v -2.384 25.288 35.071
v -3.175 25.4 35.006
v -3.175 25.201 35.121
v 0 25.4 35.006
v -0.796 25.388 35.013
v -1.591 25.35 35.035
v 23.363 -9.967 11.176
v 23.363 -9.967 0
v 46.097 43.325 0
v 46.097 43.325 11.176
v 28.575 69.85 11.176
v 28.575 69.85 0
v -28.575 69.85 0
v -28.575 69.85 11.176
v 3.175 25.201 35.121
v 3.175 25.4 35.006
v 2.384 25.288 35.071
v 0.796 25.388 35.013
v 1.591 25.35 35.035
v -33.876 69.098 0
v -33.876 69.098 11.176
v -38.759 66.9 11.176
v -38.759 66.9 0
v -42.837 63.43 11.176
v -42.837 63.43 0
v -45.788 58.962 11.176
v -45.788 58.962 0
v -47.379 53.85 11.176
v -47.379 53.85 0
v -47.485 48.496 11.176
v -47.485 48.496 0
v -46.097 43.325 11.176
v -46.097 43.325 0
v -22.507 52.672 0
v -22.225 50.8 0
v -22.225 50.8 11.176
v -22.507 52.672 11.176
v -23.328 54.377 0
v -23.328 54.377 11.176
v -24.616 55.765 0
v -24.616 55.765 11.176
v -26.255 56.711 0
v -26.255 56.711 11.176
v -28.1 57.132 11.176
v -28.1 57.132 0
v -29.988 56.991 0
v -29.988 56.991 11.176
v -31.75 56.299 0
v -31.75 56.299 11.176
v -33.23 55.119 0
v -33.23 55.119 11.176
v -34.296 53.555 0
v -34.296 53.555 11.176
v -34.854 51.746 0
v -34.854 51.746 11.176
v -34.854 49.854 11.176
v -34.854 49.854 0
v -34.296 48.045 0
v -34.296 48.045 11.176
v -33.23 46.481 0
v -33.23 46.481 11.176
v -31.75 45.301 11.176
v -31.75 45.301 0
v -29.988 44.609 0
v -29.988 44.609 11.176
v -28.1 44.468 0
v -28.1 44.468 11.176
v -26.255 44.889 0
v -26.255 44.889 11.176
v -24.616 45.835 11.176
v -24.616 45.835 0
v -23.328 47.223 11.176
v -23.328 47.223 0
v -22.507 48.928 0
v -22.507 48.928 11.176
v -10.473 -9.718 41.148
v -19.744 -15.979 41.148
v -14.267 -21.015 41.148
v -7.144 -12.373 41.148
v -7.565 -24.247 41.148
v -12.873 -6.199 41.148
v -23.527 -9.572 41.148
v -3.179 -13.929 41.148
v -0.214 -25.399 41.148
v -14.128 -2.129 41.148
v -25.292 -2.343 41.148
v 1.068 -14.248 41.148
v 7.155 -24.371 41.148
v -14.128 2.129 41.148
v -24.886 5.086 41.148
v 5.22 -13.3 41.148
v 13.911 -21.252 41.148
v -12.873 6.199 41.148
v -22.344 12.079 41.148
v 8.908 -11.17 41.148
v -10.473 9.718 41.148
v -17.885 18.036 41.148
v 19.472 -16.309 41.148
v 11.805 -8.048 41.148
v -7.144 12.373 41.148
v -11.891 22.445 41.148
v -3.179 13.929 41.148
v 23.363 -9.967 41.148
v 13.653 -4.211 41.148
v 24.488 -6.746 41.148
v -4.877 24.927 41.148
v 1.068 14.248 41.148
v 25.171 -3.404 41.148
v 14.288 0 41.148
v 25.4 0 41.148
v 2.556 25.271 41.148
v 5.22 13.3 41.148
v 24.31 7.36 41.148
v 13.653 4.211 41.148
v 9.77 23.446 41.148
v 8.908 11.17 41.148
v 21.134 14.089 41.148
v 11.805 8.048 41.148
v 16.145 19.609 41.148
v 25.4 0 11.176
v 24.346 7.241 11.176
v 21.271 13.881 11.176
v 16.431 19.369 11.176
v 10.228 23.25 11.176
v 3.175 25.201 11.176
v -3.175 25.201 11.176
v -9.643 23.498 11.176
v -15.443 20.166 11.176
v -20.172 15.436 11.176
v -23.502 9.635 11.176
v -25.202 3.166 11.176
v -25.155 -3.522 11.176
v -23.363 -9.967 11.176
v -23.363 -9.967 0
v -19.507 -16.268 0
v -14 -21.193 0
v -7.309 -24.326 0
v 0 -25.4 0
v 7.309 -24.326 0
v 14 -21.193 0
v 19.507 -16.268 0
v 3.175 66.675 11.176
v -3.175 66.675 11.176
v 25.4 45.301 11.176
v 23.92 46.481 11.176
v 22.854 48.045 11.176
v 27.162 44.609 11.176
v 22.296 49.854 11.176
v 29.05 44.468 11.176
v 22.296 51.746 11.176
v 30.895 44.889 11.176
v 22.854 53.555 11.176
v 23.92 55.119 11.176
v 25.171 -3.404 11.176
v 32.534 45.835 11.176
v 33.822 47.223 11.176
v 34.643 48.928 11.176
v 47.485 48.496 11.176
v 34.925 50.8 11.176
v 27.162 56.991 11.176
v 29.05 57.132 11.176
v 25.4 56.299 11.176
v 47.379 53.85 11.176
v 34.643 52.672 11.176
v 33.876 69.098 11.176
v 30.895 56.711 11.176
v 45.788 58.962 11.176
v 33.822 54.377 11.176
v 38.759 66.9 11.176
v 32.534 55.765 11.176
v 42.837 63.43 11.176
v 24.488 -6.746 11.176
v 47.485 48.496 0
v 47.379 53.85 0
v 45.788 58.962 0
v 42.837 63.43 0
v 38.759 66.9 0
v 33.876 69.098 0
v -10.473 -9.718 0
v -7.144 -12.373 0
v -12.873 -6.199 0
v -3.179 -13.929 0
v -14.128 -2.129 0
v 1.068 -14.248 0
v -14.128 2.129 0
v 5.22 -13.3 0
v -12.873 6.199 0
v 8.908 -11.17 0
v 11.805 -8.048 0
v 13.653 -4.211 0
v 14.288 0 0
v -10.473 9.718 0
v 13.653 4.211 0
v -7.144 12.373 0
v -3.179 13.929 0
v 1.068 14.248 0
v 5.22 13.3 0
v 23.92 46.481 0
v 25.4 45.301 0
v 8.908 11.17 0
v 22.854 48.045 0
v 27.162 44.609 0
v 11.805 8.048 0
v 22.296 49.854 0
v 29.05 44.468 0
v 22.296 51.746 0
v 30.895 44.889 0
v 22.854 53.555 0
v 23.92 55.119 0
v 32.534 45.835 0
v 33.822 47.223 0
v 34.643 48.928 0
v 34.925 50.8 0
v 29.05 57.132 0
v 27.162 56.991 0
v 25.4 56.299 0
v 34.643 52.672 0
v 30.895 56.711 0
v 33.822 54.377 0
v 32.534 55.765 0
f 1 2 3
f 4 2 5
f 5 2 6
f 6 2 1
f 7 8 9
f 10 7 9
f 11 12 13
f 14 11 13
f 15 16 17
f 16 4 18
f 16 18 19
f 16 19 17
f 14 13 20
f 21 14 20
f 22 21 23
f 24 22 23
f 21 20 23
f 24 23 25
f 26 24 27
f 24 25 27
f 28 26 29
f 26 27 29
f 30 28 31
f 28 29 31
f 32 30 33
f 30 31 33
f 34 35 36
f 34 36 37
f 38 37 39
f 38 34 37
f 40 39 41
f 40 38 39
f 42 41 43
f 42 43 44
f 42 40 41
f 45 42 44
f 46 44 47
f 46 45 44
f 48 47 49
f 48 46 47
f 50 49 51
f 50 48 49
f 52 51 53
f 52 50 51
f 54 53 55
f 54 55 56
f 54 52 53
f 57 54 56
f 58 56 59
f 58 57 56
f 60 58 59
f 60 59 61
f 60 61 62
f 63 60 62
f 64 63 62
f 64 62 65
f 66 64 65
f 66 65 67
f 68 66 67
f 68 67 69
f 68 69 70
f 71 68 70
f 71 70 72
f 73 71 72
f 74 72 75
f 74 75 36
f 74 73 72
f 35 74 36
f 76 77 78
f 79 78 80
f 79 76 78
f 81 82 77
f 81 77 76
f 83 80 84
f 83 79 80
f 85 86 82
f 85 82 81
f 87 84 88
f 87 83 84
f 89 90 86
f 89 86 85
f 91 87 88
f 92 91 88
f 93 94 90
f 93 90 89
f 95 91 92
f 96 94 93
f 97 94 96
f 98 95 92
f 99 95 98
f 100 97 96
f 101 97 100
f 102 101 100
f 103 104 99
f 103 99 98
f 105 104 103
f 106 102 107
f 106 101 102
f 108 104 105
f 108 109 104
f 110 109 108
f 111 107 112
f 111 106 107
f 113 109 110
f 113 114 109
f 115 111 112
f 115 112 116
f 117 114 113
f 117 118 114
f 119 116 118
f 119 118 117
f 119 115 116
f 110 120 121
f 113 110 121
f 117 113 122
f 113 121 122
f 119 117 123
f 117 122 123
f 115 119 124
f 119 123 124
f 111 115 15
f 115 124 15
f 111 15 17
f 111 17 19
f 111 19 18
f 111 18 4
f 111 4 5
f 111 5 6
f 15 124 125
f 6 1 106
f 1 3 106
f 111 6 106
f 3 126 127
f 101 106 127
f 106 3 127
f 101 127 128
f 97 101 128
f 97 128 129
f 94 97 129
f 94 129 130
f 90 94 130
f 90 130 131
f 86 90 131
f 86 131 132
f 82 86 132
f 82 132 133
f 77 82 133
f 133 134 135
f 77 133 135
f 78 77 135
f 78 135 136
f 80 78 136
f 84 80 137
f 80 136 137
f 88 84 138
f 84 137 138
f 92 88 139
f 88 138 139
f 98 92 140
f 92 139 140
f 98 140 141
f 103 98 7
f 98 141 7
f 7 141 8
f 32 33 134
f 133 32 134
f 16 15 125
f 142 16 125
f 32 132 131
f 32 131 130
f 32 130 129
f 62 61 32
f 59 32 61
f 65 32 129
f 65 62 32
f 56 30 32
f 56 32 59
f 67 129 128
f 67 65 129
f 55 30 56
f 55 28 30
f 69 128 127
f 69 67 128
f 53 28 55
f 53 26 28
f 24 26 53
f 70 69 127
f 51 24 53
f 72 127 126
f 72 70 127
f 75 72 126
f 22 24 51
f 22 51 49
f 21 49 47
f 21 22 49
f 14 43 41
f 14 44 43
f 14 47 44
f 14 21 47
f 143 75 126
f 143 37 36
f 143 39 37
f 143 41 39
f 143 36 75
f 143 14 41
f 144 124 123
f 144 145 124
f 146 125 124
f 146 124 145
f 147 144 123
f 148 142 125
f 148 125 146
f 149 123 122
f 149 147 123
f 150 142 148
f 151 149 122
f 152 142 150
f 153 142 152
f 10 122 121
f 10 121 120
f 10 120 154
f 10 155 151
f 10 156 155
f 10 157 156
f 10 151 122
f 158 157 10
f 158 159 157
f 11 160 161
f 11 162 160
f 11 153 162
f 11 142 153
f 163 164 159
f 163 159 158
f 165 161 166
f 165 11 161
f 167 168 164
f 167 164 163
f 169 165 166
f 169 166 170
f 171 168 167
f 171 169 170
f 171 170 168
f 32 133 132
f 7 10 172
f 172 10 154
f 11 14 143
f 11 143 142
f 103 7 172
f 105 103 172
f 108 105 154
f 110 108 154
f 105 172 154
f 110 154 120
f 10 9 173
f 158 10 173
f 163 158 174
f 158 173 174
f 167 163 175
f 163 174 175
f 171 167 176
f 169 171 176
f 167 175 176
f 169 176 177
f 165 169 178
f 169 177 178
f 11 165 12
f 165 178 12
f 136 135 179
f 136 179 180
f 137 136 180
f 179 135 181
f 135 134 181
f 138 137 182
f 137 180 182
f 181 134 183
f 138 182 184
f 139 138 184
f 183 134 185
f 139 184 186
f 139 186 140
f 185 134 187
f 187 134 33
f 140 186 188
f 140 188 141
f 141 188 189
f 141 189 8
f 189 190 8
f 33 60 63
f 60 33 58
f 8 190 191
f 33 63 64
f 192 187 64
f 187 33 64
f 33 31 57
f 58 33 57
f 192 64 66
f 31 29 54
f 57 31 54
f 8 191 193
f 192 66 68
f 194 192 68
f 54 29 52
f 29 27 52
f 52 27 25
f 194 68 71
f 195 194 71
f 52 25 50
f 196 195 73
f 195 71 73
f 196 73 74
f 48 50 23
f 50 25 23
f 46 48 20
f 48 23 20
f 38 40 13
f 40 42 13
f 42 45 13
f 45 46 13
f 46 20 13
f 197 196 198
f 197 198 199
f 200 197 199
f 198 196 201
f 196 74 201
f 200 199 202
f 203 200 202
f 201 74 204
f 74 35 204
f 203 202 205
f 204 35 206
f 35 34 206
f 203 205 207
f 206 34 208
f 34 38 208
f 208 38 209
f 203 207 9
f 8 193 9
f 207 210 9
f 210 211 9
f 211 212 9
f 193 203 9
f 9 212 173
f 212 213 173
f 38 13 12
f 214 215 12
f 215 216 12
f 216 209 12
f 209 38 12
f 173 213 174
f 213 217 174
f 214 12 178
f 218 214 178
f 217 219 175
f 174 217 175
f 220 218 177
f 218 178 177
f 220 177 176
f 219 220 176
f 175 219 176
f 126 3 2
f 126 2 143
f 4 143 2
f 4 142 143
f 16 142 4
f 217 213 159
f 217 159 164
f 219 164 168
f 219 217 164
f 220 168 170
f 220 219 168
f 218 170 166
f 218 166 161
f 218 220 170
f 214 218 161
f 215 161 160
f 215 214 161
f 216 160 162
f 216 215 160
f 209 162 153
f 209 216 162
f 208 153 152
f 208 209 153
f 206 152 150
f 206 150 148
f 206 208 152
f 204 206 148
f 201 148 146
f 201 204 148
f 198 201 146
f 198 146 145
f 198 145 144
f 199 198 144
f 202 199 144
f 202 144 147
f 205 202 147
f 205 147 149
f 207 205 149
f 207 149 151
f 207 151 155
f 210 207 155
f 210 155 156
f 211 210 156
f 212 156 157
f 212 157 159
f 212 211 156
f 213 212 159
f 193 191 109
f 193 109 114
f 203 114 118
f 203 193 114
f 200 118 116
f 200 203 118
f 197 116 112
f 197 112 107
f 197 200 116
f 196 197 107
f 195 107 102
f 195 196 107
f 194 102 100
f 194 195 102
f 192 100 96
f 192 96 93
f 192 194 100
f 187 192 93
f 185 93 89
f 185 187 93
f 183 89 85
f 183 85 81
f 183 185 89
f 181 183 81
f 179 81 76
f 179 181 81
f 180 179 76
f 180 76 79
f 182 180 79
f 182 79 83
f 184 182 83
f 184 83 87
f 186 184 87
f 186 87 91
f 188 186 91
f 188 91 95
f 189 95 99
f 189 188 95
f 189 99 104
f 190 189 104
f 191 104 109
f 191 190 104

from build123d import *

# Parameters (mm, degrees)
F0_R     = 14.2875
F1_DEPTH = 41.148
F0_R_2   = 6.35
F2_DEPTH = 11.176
F4_DEPTH = 3.175


# Not quite as in the source:
# - a feature of the source that left no trace in its solid (it failed there, or was rolled back) is left out


with BuildPart() as f1:
    # F0 (on Top) → F1 (new body)
    with BuildSketch(Plane.XY):
        with BuildLine():
            ThreePointArc((23.3629201096, -9.9666425617), (24.8855195926, -5.0863458994), (25.4, 0))
            ThreePointArc((25.4, 0), (-5.0863458994, 24.8855195926), (-23.3629201096, -9.9666425617))
            ThreePointArc((-23.3629201096, -9.9666425617), (0, -25.4), (23.3629201096, -9.9666425617))
        make_face()
        Circle(F0_R, mode=Mode.SUBTRACT)
    extrude(amount=F1_DEPTH)

    # F0 (on Top) → F2 (join)
    with BuildSketch(Plane.XY):
        with BuildLine():
            ThreePointArc((-23.3629201096, -9.9666425617), (-5.0863458994, 24.8855195926), (25.4, 0))
            ThreePointArc((25.4, 0), (24.8855195926, -5.0863458994), (23.3629201096, -9.9666425617))
            Line((23.3629201096, -9.9666425617), (46.0971900822, 43.3250180788))
            ThreePointArc((46.0971900822, 43.3250180788), (44.4699820006, 61.3000974853), (28.575, 69.85))
            Line((28.575, 69.85), (-28.575, 69.85))
            ThreePointArc((-28.575, 69.85), (-44.4699820006, 61.3000974853), (-46.0971900822, 43.3250180788))
            Line((-46.0971900822, 43.3250180788), (-23.3629201096, -9.9666425617))
        make_face()
        with Locations((-28.575, 50.8)):
            Circle(F0_R_2, mode=Mode.SUBTRACT)
        with Locations((28.575, 50.8)):
            Circle(F0_R_2, mode=Mode.SUBTRACT)
    extrude(amount=F2_DEPTH)

    # F3 (on Right) → F4 (join, symmetric)
    with BuildSketch(Plane.YZ):
        Polygon((66.675, 11.176), (25.4, 35.0061323608), (25.4, 11.176), align=None)
        Polygon((25.4, 11.176), (25.4, 35.0061323608), (22.225, 36.8392194655), (22.225, 11.176), align=None)
    extrude(amount=F4_DEPTH, both=True)


solid = f1.part
